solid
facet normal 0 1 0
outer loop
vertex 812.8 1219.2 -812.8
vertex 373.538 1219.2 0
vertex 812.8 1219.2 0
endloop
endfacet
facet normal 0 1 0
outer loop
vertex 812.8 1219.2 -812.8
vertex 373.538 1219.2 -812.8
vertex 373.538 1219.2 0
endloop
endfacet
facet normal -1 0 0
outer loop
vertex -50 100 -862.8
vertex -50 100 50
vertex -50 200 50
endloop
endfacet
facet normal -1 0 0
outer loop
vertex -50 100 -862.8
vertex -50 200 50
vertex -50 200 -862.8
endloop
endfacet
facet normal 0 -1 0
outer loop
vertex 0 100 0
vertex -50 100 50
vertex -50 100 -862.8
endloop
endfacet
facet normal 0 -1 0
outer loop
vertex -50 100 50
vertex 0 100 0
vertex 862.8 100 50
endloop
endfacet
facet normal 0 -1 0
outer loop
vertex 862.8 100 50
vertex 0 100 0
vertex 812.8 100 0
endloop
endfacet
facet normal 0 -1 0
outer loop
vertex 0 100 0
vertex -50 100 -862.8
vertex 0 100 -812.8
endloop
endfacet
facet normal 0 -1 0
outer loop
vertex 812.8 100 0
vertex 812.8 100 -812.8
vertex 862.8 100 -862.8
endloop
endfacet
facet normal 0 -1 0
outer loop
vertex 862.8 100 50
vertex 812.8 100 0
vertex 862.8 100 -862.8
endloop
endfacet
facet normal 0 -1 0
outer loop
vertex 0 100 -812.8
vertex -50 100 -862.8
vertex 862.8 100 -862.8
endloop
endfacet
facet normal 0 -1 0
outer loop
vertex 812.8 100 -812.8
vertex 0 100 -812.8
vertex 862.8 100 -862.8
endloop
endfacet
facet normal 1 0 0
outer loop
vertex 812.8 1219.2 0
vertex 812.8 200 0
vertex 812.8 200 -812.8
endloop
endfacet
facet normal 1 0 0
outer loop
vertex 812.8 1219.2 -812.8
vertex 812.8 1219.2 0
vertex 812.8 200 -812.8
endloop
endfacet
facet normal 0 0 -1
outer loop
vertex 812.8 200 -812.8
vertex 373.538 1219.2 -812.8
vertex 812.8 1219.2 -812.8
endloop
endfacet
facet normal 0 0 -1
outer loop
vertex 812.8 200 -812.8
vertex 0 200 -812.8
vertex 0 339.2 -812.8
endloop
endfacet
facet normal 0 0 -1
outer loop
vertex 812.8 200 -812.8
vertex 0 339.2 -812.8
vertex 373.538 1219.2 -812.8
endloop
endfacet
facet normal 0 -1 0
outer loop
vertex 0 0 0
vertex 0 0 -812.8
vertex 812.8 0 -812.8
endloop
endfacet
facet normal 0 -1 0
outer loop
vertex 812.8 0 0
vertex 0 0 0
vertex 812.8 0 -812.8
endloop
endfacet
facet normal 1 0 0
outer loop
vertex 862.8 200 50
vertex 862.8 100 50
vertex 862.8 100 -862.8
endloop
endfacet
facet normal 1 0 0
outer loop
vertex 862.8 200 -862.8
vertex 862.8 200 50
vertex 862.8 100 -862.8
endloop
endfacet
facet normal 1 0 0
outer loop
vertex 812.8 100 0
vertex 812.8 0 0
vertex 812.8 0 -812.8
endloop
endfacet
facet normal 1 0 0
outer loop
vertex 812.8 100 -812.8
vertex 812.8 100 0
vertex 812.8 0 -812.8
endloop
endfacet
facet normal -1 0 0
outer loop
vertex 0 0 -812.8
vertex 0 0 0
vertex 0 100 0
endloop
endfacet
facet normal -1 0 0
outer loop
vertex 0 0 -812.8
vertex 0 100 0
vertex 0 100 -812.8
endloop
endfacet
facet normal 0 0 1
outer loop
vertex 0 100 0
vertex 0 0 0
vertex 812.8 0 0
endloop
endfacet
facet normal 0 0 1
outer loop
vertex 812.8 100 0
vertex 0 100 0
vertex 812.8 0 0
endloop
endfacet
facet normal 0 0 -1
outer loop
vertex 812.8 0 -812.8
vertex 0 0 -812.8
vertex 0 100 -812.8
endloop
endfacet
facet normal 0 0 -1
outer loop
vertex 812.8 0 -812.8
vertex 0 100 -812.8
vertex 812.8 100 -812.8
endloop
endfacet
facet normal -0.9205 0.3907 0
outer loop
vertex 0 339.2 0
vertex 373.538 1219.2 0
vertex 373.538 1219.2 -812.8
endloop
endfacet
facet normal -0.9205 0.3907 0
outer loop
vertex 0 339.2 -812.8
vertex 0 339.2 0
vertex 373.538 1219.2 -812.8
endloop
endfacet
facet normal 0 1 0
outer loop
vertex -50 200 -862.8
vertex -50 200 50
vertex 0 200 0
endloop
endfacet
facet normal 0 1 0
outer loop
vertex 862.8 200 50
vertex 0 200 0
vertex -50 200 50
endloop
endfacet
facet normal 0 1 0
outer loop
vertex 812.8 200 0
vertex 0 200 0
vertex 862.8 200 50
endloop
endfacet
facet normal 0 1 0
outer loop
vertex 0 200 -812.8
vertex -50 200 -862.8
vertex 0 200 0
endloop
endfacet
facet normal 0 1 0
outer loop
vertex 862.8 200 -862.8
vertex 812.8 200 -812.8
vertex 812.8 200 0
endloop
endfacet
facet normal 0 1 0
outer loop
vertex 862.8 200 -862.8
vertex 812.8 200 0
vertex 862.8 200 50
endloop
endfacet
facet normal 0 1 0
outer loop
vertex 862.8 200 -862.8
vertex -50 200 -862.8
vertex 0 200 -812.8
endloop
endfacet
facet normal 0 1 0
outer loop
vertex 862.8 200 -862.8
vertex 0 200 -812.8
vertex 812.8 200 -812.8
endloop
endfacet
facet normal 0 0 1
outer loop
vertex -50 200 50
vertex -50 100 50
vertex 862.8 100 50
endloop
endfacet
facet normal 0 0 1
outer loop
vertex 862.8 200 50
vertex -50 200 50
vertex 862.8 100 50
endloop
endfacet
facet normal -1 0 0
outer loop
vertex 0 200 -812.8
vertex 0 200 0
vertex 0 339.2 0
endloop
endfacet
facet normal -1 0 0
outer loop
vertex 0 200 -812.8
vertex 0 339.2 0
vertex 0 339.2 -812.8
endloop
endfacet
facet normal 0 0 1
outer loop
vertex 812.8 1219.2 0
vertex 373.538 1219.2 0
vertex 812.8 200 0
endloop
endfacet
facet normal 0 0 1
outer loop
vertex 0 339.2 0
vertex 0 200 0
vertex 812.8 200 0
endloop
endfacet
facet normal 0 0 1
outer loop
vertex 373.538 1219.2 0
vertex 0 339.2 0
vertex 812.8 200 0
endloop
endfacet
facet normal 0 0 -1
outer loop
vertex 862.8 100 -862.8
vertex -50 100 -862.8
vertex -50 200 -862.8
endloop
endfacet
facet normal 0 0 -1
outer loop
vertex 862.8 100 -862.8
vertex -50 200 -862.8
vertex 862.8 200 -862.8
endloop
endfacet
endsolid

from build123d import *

# Parameters (mm, degrees)
SKETCH2_W           = 812.8
SKETCH2_H           = 812.8
BOSS_EXTRUDE1_DEPTH = 1219.2
SKETCH3_W           = 912.8
SKETCH3_H           = 912.8
SKETCH3_W_2         = 812.8
SKETCH3_H_2         = 812.8
BOSS_EXTRUDE2_DEPTH = 100
CHAMFER4_SIZE       = 880
CHAMFER4_SIZE2      = 373.537838264


with BuildPart() as part:
    # Sketch2 → Boss-Extrude1 (new body)
    with BuildSketch(Plane(origin=(0, 0, 0), x_dir=(1, 0, 0), z_dir=(0, 1, 0))):
        with Locations((406.4, 406.4)):
            Rectangle(SKETCH2_W, SKETCH2_H)
    extrude(amount=BOSS_EXTRUDE1_DEPTH)

    # Sketch3 → Boss-Extrude2 (add)
    with BuildSketch(Plane(origin=(0, 100, 0), x_dir=(1, 0, 0), z_dir=(0, 1, 0))):
        with Locations((406.4, 406.4)):
            Rectangle(SKETCH3_W, SKETCH3_H)
        with Locations((406.4, 406.4)):
            Rectangle(SKETCH3_W_2, SKETCH3_H_2, mode=Mode.SUBTRACT)
    extrude(amount=BOSS_EXTRUDE2_DEPTH)

    # Chamfer4
    chamfer4_edges = [part.edges().sort_by_distance(p)[0] for p in [
        (0, 1219.2, -406.4),
    ]]
    chamfer4_side = [part.faces().sort_by_distance(p)[0] for p in [
        (0, 709.6, -406.4),
    ]]
    chamfer(chamfer4_edges, length=CHAMFER4_SIZE, length2=CHAMFER4_SIZE2, reference=chamfer4_side[0])


solid = part.part
